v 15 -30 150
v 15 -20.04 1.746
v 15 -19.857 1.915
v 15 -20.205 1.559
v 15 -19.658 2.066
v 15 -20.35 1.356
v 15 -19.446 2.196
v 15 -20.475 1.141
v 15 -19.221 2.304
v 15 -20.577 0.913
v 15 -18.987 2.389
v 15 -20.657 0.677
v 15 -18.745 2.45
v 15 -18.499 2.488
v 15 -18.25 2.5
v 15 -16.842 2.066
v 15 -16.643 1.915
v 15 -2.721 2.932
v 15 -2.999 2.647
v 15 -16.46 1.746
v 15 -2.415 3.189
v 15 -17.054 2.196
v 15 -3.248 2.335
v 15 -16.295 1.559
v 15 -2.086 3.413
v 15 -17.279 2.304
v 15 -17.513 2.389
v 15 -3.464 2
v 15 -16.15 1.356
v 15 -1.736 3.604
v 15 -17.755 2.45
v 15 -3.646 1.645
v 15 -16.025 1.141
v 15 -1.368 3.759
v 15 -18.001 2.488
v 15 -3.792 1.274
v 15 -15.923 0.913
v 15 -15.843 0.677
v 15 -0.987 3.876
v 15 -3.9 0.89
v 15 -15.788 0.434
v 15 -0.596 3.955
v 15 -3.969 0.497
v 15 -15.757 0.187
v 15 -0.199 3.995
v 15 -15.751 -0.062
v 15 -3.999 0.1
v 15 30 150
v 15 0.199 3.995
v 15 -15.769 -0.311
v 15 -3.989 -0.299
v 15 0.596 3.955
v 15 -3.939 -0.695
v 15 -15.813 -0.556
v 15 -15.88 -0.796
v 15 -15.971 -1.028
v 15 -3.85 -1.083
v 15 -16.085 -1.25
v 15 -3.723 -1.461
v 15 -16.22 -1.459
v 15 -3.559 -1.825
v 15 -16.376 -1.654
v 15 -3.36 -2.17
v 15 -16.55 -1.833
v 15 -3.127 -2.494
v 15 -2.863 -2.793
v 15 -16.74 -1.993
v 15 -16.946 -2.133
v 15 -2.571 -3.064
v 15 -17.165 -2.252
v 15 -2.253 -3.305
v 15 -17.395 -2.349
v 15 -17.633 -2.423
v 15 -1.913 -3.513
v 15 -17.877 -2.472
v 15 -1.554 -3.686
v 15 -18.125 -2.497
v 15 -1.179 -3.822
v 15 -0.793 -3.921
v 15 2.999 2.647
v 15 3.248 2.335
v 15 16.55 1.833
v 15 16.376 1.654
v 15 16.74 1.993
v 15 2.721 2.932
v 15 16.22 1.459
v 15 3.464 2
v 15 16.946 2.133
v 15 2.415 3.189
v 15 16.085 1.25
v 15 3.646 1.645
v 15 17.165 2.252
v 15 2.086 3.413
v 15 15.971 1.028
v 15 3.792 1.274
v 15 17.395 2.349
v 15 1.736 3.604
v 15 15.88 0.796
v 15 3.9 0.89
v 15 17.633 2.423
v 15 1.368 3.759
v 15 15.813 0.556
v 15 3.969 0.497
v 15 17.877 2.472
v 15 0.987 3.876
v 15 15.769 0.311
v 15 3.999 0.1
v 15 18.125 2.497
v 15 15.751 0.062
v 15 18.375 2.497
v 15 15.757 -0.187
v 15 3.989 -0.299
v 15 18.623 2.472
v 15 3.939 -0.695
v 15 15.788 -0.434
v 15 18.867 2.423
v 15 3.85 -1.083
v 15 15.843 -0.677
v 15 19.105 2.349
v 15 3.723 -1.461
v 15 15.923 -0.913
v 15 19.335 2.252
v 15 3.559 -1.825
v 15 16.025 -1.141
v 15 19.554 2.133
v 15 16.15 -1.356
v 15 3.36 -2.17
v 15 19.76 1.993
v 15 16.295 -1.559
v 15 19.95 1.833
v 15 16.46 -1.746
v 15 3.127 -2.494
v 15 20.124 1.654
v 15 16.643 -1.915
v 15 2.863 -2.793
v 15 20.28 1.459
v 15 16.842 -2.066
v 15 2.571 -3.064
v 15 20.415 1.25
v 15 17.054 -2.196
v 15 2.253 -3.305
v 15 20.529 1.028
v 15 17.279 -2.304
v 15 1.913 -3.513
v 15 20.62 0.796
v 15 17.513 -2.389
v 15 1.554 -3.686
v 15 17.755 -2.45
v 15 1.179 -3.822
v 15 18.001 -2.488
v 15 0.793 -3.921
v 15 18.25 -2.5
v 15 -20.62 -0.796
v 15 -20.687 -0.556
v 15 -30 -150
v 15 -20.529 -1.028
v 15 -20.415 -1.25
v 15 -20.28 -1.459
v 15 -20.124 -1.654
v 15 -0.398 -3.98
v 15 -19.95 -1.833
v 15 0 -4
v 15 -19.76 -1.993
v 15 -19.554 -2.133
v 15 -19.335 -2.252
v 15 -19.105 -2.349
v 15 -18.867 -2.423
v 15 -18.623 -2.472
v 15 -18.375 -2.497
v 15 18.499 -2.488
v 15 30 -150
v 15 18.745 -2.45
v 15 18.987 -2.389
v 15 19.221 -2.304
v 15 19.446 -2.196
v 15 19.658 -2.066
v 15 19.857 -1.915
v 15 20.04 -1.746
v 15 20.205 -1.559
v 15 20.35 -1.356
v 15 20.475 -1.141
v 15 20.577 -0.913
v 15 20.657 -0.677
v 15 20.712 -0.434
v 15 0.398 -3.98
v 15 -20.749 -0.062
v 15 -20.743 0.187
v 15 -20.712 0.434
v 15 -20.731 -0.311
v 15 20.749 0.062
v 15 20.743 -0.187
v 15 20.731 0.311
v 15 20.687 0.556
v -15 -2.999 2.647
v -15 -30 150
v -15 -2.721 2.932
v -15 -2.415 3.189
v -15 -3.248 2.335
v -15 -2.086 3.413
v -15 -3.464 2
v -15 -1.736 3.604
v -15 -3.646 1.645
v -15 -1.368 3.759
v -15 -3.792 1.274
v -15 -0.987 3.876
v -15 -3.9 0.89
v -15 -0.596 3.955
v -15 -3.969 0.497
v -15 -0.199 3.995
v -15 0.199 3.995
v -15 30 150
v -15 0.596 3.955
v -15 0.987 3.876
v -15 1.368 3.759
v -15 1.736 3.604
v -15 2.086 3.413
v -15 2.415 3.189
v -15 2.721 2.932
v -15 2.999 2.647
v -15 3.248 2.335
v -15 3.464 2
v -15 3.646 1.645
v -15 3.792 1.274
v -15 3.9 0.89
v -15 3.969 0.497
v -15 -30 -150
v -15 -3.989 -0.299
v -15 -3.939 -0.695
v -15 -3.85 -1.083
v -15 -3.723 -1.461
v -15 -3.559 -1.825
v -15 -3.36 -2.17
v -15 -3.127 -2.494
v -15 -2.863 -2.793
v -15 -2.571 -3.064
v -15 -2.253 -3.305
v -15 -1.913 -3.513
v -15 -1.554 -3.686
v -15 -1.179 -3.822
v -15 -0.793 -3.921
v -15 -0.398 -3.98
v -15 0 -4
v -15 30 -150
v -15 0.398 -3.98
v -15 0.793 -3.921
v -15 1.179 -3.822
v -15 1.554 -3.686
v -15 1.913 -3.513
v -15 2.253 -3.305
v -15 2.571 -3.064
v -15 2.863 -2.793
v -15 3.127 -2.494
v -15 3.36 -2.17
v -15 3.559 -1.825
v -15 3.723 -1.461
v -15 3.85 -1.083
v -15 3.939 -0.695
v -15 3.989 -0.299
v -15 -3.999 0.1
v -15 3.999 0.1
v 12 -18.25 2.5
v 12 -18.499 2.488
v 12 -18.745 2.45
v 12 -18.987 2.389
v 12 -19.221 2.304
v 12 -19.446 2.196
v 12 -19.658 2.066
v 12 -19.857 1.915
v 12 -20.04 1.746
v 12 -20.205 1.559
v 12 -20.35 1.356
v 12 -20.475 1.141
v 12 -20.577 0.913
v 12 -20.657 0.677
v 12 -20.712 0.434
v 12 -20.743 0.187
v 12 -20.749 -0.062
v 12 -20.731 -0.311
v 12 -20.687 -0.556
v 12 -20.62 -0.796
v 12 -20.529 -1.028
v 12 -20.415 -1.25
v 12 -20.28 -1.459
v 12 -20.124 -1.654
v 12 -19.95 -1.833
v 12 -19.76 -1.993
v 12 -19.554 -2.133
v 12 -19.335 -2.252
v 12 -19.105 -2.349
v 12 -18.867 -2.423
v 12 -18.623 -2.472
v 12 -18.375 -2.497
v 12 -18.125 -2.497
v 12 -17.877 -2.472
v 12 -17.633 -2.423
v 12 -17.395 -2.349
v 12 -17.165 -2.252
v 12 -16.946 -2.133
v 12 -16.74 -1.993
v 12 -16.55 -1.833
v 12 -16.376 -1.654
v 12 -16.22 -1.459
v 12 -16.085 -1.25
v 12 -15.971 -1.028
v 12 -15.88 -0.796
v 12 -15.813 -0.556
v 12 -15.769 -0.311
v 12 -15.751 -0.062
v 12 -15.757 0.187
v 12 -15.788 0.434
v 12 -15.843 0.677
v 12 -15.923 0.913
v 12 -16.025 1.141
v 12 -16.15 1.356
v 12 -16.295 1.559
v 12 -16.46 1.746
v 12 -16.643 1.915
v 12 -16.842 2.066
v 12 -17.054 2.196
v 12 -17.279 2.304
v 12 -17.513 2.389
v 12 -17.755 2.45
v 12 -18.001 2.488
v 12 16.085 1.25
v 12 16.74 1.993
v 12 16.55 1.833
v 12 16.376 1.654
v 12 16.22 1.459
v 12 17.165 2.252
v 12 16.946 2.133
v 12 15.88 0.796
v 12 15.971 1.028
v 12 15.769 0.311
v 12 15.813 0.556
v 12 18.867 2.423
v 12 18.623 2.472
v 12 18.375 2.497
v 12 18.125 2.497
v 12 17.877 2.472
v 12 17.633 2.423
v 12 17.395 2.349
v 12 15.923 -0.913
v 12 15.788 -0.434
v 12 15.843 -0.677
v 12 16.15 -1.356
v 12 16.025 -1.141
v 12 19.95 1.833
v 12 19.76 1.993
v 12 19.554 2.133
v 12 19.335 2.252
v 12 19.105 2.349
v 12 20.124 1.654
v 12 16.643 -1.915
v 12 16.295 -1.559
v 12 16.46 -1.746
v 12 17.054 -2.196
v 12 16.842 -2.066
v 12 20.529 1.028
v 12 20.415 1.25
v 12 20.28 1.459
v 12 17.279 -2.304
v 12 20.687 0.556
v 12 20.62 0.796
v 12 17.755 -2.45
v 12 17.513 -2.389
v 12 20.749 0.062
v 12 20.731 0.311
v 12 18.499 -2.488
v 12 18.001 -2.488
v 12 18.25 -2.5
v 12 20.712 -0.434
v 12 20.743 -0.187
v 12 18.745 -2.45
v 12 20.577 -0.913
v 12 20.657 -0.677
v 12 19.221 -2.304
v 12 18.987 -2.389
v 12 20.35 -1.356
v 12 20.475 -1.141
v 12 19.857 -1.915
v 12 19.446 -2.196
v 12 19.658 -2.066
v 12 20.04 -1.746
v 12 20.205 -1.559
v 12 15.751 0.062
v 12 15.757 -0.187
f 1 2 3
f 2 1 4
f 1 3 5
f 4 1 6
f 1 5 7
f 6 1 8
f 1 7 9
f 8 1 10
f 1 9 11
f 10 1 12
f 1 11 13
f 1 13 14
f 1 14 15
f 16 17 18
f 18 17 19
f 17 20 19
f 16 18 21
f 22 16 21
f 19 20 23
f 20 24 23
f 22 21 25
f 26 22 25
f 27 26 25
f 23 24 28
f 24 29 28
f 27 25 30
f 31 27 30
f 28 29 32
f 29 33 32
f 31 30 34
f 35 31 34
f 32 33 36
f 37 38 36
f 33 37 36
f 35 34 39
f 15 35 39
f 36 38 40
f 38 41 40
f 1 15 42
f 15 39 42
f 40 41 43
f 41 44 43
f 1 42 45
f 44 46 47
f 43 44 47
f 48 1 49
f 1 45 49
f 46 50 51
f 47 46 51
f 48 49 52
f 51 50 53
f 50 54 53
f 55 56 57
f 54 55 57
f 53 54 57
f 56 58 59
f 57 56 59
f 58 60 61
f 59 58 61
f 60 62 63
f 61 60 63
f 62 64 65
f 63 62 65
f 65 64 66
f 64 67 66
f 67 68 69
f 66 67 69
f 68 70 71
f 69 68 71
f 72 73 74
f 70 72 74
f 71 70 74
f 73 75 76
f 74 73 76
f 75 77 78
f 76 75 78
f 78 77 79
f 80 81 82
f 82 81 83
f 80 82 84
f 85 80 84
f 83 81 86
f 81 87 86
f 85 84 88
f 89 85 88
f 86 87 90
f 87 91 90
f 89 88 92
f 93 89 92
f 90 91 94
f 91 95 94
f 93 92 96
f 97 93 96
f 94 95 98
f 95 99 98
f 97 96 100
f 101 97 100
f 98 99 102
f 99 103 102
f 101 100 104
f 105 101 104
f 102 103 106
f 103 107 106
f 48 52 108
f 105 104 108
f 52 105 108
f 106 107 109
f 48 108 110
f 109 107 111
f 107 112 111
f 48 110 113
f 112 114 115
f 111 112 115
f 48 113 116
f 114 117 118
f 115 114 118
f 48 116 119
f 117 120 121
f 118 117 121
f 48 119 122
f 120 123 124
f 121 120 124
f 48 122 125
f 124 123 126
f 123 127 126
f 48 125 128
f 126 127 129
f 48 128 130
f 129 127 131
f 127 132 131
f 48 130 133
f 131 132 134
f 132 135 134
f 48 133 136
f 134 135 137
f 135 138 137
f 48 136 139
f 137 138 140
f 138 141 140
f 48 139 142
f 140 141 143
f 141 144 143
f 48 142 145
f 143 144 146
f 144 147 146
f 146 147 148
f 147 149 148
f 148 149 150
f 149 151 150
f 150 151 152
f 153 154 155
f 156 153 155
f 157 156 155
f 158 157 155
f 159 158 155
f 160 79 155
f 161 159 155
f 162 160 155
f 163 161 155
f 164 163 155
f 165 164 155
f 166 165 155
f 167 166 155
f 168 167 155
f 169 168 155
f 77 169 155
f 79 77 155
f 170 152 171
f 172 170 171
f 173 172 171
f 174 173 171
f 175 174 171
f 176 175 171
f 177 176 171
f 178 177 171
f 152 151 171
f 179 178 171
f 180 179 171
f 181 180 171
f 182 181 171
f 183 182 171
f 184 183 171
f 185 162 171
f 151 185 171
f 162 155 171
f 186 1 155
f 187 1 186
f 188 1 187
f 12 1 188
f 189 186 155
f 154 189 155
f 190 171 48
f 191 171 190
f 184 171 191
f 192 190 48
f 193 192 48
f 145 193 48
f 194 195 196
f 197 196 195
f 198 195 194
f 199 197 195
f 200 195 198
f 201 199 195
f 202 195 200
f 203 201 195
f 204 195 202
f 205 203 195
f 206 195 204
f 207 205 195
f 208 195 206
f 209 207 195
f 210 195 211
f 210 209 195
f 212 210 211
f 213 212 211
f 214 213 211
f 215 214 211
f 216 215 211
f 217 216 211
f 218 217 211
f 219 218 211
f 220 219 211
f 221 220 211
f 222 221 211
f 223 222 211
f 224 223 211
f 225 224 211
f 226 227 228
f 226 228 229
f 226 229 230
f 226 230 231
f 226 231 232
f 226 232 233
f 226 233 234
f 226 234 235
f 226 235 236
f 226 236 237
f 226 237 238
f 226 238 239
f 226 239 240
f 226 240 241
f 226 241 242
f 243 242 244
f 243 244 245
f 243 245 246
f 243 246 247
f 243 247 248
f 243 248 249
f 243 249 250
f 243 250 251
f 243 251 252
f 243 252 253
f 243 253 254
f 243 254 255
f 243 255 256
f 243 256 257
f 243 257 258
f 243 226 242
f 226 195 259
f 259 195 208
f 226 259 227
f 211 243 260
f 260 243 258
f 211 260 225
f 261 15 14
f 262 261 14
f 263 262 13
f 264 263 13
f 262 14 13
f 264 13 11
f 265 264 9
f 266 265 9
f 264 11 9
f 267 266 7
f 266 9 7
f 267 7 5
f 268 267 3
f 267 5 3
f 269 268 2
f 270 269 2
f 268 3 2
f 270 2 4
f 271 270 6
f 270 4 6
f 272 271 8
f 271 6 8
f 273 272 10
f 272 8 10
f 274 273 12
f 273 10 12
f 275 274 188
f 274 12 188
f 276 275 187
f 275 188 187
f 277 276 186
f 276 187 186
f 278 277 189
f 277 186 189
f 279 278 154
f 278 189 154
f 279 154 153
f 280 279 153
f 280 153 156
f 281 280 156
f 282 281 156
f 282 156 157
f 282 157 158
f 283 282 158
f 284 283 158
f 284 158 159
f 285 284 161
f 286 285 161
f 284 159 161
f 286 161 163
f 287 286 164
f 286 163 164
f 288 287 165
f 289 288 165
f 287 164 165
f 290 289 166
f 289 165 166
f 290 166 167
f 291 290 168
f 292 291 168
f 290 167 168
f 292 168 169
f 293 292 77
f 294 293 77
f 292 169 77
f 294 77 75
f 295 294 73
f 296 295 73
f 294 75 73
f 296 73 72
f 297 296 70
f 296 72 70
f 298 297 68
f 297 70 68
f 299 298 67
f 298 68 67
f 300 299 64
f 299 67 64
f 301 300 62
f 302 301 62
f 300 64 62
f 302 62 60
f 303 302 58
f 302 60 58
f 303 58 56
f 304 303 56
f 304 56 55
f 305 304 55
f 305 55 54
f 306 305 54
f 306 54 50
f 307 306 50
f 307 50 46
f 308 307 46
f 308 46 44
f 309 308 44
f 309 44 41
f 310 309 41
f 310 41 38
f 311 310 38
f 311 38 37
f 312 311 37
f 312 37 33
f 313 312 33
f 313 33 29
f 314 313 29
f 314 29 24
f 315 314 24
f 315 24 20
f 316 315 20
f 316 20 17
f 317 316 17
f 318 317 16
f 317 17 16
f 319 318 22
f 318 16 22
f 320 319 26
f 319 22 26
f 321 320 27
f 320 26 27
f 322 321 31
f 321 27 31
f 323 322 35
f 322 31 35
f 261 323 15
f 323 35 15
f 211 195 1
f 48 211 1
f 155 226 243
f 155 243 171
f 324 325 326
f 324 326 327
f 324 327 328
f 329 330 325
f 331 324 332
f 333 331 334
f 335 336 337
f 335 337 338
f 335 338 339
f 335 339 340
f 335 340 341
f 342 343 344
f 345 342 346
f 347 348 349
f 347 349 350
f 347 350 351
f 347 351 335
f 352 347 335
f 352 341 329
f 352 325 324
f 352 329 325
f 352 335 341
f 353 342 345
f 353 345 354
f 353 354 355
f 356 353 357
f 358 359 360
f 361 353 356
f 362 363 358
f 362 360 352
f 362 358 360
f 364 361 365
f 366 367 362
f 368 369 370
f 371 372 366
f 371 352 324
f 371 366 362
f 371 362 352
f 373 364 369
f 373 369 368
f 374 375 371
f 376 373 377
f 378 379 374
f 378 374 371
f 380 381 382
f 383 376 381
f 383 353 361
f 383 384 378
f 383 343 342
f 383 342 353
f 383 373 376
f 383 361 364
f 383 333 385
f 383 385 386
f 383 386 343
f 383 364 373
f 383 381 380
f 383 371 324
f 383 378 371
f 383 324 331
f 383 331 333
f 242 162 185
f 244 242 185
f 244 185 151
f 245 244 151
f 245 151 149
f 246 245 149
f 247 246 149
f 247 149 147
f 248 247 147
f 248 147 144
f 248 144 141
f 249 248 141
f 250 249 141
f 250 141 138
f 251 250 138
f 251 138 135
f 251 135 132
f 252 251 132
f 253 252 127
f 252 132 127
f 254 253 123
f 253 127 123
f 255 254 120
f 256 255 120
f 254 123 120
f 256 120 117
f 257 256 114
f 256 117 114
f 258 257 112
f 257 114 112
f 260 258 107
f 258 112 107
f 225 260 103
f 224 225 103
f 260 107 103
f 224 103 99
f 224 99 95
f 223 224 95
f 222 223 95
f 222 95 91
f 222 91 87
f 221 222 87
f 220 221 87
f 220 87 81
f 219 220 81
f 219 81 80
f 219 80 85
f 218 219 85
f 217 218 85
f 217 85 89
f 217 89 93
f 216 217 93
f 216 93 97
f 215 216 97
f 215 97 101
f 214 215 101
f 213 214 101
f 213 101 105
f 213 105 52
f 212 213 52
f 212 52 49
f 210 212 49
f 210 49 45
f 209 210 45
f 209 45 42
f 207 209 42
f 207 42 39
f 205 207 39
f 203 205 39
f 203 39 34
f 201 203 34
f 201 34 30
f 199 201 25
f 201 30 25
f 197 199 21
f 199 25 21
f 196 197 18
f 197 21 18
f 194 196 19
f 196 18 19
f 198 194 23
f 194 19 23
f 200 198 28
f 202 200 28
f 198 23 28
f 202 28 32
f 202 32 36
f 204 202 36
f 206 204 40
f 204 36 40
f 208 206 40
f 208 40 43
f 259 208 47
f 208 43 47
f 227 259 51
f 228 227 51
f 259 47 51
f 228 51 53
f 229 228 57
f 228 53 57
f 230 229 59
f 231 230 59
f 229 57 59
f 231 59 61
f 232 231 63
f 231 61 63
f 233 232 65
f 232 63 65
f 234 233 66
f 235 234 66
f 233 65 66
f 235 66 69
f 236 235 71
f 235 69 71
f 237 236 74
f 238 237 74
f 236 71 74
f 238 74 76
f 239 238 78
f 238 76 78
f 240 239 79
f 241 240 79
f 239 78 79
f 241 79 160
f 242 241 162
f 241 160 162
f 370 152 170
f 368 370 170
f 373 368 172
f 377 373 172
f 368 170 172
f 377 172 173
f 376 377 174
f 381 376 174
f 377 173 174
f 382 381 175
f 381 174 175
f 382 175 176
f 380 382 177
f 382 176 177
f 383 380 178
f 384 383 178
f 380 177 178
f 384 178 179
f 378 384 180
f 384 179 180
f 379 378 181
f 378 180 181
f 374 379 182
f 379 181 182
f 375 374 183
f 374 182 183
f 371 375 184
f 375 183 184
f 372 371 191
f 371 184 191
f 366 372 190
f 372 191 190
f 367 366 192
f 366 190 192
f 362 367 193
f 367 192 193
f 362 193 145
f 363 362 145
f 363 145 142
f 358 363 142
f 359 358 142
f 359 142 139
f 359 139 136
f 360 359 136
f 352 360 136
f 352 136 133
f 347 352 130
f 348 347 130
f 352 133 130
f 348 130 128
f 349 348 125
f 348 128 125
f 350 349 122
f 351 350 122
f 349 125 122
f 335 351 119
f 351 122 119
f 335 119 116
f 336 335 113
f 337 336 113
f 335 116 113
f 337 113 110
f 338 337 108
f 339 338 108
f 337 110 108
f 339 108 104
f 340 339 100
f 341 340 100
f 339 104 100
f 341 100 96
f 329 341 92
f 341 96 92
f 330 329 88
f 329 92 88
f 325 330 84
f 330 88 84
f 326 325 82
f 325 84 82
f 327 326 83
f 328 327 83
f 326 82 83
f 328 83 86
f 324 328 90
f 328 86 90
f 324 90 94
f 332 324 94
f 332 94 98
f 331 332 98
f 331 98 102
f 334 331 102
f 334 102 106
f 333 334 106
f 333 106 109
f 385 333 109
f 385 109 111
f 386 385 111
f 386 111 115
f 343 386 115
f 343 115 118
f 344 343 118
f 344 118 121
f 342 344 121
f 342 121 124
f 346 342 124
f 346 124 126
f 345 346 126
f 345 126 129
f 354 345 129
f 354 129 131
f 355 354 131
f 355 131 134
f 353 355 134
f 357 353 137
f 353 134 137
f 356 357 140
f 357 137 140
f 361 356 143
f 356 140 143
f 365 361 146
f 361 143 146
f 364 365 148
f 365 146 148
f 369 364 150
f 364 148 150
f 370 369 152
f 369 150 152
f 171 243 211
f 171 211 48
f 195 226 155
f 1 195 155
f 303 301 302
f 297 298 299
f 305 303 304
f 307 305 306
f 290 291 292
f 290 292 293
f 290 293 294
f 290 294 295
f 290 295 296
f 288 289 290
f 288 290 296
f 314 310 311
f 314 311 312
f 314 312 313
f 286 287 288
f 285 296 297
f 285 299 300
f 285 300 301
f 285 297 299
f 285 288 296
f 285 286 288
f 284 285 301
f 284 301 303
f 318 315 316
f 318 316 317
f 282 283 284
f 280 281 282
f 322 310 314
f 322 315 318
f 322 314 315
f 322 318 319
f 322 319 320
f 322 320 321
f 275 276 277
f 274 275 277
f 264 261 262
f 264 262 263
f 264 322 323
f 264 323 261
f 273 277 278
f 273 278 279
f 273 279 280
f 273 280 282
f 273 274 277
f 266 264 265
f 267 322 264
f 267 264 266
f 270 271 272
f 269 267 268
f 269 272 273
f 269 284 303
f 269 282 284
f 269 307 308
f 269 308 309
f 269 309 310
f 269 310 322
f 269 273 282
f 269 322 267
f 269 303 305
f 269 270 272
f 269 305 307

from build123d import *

# Parameters (mm, degrees)
BOSS_EXTRUDE1_DEPTH      = 150
BOSS_EXTRUDE1_DEPTH_BACK = 150
SKETCH1_W                = 30
SKETCH1_H                = 60
SKETCH2_R                = 2.5
CUT_EXTRUDE1_DEPTH       = 3
SKETCH3_R                = 4
CUT_EXTRUDE2_DEPTH       = 156.884572681


with BuildPart() as part:
    # Sketch1 → Boss-Extrude1 (new, two sides: drawn at the far end of the back side and taken through both)
    with BuildSketch(Plane.XY.offset(-BOSS_EXTRUDE1_DEPTH_BACK)):
        Rectangle(SKETCH1_W, SKETCH1_H)
    extrude(amount=BOSS_EXTRUDE1_DEPTH + BOSS_EXTRUDE1_DEPTH_BACK)

    # Sketch2 → Cut-Extrude1 (cut)
    with BuildSketch(Plane(origin=(15, 0, 0), x_dir=(0, 0, -1), z_dir=(1, 0, 0))):
        with Locations((0, 18.25)):
            Circle(SKETCH2_R)
        with Locations((0, -18.25)):
            Circle(SKETCH2_R)
    extrude(amount=-CUT_EXTRUDE1_DEPTH, mode=Mode.SUBTRACT)

    # Sketch3 → Cut-Extrude2 (cut, through all)
    with BuildSketch(Plane(origin=(15, 0, 0), x_dir=(0, 0, -1), z_dir=(1, 0, 0))):
        Circle(SKETCH3_R)
    extrude(amount=-CUT_EXTRUDE2_DEPTH, mode=Mode.SUBTRACT)


solid = part.part
